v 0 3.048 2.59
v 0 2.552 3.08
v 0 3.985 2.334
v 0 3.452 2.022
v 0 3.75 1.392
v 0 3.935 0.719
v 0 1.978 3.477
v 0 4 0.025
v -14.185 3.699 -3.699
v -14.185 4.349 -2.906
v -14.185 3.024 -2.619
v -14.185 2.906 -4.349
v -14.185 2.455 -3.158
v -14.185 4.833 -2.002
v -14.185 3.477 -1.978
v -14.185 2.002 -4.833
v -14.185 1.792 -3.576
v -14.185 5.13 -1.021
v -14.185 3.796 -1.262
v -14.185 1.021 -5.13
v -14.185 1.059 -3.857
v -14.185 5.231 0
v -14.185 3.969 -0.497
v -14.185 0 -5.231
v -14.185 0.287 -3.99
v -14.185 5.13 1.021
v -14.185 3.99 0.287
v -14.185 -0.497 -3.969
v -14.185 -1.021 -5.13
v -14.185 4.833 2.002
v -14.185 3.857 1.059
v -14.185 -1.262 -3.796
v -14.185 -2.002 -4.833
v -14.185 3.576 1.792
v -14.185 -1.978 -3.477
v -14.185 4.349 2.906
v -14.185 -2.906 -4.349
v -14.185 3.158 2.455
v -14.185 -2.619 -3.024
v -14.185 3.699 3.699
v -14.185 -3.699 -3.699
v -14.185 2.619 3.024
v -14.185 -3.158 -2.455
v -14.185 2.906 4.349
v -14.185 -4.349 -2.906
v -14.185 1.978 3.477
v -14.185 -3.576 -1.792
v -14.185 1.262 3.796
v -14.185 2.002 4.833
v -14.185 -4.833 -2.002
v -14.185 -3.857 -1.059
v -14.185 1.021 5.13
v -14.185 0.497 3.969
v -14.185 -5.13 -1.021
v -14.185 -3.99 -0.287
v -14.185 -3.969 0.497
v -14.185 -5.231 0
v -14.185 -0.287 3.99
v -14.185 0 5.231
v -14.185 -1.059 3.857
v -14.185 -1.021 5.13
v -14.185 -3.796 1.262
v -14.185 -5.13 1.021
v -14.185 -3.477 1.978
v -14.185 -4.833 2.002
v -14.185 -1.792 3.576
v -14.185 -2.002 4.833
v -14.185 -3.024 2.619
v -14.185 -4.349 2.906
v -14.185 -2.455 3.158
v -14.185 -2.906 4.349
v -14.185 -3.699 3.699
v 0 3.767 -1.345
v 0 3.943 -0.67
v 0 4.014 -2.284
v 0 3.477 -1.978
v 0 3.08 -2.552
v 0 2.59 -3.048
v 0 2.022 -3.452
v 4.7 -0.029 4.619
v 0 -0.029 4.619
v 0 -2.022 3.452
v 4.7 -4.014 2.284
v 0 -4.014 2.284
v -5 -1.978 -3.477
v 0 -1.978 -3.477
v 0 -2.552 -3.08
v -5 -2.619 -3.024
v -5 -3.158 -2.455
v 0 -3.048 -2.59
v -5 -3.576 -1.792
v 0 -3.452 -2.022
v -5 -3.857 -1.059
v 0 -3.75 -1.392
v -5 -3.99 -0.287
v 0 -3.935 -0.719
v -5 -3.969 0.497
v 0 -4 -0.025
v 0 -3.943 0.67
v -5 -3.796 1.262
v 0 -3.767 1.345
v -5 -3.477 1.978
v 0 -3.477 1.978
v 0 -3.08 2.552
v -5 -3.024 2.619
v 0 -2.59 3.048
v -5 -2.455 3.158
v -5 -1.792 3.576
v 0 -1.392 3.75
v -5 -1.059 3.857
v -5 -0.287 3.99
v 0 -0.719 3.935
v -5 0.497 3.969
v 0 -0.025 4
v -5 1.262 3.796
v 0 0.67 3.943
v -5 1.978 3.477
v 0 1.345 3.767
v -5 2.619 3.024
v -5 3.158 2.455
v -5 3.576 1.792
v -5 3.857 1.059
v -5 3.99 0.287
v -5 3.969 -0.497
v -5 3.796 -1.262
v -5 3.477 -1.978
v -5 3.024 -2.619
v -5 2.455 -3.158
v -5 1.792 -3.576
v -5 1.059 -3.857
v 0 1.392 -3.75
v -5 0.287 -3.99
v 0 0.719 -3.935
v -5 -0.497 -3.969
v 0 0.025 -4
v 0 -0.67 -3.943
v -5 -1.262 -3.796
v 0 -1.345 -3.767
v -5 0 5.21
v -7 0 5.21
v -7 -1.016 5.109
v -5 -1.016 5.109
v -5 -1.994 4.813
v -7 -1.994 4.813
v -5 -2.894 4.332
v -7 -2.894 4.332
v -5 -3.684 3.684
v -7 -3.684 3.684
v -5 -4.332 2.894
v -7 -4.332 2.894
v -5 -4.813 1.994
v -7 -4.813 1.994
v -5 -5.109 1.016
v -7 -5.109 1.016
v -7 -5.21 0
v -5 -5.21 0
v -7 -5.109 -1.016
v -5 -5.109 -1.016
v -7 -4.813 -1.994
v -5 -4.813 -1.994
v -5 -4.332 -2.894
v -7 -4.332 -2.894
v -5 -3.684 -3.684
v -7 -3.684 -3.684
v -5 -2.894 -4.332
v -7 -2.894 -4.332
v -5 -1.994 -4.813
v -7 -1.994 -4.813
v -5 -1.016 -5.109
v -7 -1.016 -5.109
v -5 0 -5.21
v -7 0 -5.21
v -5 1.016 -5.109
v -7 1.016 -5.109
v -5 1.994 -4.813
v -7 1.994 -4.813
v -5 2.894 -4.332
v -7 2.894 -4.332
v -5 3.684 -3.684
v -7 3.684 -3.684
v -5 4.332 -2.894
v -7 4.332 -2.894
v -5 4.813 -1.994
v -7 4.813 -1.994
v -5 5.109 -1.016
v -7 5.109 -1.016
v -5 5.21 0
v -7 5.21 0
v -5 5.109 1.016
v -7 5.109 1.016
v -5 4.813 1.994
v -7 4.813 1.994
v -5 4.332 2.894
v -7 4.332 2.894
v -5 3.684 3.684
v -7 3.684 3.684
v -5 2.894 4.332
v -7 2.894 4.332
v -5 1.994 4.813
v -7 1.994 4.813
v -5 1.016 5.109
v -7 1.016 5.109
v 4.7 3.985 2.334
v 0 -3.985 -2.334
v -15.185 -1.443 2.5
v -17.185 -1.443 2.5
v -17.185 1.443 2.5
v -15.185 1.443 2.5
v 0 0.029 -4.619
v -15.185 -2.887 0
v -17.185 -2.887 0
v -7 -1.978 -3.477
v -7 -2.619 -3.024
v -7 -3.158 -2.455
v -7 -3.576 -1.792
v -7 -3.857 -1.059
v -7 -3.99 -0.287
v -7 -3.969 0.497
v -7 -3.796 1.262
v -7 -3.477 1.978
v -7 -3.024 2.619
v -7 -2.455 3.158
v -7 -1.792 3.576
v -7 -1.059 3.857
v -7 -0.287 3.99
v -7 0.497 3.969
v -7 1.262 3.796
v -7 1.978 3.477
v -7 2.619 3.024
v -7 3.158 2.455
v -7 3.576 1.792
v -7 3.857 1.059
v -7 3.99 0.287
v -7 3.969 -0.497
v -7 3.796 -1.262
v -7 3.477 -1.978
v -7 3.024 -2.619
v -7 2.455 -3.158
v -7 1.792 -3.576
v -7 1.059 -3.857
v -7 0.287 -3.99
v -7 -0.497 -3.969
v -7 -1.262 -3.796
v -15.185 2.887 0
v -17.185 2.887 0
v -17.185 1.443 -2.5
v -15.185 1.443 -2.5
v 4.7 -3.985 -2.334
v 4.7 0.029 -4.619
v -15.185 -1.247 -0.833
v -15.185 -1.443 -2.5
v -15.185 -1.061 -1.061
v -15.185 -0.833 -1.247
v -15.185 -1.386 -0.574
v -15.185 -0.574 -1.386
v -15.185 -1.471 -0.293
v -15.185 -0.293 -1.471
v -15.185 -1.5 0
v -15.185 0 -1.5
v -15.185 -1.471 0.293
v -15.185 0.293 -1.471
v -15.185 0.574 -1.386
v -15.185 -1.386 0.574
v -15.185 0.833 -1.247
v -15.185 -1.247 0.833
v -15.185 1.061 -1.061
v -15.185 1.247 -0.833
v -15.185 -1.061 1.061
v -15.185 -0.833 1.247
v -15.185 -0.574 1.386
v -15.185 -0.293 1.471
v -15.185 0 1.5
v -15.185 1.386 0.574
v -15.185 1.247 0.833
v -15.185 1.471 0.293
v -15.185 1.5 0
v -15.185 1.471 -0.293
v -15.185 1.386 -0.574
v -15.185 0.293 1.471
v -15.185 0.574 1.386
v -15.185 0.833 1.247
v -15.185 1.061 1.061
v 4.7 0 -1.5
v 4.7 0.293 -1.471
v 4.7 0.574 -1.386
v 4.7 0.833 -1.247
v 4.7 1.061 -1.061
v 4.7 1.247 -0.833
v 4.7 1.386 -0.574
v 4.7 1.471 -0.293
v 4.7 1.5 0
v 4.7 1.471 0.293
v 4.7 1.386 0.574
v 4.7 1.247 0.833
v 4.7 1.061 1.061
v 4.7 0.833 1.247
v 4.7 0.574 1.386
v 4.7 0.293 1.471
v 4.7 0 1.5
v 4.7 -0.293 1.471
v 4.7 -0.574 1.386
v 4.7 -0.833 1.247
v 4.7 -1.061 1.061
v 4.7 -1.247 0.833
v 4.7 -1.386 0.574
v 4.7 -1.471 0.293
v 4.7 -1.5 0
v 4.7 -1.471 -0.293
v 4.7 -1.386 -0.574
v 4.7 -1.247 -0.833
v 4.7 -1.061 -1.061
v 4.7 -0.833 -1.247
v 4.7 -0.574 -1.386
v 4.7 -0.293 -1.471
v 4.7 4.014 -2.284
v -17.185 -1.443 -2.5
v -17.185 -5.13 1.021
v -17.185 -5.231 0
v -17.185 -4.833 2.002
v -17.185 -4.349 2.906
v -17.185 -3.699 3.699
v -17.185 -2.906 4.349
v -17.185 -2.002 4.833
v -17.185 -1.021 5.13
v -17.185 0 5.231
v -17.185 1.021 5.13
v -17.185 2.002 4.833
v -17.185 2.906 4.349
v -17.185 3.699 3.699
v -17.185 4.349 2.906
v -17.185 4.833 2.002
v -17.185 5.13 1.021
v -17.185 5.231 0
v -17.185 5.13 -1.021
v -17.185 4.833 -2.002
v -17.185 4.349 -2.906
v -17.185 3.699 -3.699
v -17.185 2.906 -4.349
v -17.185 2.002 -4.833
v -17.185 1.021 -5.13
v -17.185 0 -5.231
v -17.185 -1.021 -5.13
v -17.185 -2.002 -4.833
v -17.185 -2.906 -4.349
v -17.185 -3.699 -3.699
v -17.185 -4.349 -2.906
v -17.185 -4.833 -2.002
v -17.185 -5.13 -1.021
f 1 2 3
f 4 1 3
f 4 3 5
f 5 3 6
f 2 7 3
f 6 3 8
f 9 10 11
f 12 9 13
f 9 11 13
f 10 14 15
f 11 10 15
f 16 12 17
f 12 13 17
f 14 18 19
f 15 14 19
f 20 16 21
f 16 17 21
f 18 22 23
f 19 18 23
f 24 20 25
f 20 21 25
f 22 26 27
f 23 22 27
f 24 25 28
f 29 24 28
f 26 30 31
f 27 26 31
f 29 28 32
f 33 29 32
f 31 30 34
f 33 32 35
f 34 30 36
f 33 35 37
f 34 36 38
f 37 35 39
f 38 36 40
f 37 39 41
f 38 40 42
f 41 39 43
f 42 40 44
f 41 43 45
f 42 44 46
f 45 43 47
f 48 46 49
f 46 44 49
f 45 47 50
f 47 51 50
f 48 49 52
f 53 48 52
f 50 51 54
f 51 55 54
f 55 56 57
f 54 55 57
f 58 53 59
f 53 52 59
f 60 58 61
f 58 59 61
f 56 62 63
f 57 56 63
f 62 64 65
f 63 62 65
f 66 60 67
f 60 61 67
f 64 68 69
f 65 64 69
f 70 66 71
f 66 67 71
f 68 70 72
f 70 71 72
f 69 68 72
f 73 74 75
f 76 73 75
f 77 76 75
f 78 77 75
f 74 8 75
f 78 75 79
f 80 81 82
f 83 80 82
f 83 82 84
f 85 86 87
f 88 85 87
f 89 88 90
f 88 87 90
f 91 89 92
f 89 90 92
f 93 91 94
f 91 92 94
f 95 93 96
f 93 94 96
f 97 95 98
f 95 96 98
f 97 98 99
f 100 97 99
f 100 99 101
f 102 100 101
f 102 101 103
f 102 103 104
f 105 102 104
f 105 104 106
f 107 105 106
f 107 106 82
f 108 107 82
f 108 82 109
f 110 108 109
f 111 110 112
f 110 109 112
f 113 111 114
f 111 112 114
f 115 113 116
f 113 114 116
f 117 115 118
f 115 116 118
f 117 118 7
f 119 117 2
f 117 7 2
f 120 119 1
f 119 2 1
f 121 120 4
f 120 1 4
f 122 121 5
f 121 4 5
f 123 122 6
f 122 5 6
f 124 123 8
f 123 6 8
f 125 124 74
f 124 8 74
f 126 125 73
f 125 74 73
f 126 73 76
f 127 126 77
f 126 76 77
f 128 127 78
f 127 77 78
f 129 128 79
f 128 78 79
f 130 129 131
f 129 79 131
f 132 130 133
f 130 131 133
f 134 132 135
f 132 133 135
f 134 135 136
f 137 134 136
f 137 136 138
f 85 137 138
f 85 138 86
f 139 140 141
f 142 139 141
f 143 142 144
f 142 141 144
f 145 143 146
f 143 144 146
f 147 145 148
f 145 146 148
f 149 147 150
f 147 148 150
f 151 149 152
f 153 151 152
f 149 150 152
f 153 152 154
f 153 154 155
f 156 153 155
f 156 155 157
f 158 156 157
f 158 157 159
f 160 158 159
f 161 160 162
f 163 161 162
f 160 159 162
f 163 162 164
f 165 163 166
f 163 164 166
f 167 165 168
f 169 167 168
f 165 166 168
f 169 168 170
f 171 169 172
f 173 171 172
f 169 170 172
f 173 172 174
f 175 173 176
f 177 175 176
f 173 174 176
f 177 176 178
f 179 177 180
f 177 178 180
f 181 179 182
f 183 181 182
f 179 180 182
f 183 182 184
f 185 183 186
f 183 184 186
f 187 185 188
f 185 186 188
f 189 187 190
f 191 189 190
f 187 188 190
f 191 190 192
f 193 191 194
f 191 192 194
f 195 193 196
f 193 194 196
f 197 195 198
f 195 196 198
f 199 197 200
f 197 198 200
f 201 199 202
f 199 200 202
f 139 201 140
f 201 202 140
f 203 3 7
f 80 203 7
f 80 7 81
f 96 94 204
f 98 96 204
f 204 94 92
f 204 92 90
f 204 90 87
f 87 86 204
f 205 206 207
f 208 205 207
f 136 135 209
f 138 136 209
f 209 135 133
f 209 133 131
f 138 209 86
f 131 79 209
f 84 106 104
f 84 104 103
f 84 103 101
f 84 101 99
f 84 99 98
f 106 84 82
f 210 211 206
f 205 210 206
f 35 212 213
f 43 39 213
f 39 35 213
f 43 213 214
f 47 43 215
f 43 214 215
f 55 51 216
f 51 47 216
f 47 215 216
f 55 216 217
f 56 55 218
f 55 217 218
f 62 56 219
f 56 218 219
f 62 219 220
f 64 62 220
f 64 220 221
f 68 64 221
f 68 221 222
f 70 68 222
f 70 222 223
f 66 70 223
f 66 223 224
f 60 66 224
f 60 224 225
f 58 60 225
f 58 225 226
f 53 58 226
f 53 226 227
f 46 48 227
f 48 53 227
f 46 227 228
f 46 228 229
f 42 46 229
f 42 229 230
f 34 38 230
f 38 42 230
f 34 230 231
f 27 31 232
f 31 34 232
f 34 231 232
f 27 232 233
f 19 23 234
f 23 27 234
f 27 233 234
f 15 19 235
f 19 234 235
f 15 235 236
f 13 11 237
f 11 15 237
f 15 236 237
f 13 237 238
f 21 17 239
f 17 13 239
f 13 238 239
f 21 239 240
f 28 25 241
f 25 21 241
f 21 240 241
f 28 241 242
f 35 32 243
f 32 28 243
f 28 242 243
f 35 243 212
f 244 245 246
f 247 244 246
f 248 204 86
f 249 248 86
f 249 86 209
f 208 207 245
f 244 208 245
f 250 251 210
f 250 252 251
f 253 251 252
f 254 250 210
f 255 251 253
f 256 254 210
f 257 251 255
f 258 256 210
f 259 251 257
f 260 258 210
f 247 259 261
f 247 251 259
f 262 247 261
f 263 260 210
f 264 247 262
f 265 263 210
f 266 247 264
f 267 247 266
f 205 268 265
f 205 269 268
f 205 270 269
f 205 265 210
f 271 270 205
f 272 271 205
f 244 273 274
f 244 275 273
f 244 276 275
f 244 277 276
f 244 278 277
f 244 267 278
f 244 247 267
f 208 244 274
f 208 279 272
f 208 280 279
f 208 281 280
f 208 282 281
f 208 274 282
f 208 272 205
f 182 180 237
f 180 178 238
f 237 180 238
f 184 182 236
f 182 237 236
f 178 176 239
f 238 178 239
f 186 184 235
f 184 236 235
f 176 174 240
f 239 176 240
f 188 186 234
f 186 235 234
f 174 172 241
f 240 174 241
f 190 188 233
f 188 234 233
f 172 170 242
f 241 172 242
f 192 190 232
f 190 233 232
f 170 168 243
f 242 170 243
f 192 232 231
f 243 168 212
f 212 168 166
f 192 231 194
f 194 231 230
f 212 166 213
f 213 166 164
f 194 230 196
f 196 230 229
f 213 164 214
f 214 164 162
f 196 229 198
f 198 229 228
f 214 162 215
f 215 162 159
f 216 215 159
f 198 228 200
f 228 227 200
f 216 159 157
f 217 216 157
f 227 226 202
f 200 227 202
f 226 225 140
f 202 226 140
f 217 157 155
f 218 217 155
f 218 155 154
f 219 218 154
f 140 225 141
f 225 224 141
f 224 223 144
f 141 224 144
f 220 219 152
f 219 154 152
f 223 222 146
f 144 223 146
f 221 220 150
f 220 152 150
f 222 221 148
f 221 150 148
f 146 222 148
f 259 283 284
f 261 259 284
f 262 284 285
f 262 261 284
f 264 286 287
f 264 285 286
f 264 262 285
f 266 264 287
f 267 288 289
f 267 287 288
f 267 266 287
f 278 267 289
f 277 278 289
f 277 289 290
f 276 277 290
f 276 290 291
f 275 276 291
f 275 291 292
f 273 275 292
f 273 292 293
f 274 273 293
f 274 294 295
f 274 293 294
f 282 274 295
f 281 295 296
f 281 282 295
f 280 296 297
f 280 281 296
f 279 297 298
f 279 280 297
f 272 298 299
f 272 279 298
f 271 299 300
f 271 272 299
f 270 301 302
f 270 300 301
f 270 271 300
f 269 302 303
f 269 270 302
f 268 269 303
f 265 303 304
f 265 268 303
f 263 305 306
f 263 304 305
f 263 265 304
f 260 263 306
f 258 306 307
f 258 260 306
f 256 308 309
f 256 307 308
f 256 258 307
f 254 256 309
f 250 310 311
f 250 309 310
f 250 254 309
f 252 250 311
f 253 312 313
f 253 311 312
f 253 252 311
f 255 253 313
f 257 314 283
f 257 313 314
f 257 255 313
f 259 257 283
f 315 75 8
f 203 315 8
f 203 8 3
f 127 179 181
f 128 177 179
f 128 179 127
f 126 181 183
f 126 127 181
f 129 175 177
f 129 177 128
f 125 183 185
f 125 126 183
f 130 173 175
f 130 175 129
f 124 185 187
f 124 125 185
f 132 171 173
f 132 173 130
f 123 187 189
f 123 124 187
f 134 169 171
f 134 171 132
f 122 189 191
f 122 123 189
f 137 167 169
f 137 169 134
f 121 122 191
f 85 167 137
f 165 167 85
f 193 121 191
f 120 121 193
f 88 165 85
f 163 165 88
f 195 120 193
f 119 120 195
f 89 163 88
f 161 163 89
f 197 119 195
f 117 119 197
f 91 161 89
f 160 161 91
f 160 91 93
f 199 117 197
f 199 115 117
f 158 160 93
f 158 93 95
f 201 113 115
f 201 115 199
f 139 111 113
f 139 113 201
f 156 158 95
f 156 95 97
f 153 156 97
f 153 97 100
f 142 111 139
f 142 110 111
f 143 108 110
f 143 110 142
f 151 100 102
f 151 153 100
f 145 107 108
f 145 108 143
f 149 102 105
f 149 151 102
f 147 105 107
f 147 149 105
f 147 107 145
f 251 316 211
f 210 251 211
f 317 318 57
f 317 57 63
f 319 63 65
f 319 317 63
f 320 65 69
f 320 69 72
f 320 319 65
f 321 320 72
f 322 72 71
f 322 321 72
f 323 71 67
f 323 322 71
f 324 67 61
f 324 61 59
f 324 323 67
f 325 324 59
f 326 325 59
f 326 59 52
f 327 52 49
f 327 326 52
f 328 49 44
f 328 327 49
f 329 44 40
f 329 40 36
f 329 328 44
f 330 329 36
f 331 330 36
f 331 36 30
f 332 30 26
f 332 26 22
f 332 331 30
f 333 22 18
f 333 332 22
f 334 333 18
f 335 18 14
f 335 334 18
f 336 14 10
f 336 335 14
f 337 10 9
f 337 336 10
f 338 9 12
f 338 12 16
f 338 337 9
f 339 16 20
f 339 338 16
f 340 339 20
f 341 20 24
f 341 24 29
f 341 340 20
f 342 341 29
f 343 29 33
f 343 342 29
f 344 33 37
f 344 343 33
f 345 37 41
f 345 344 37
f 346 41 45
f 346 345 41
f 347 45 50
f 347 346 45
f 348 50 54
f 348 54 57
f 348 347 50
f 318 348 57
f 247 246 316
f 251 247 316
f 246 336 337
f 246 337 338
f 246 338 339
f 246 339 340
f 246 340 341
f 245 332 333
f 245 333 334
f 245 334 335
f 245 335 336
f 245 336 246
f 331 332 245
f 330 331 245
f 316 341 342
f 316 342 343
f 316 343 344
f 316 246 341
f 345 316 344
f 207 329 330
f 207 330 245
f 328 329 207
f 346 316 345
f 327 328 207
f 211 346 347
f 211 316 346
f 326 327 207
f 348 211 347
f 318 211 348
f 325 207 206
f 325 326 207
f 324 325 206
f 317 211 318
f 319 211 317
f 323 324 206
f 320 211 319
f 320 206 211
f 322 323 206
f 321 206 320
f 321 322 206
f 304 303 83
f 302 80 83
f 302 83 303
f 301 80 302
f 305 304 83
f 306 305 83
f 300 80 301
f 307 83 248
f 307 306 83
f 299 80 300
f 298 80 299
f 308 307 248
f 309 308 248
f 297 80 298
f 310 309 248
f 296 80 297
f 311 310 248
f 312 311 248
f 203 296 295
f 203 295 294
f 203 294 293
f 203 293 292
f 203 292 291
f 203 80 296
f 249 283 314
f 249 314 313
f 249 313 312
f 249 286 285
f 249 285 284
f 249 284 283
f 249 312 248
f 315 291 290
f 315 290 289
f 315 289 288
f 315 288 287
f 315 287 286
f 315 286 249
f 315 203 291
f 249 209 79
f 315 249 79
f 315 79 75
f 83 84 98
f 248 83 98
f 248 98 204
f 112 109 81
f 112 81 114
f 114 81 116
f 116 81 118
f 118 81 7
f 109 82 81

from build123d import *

# Parameters (mm, degrees)
BOSS_EXTRUDE1_DEPTH     = 4.7
SKETCH3_R               = 4
SKETCH3_R_2             = 1.5
BOSS_EXTRUDE2_DEPTH     = 17.185
SKETCH4_R               = 5.231012233
BOSS_EXTRUDE3_DEPTH     = 3
CUT_EXTRUDE1_DEPTH      = 24.101519495
CUT_EXTRUDE1_DEPTH_BACK = 24.101519495
SKETCH2_R               = 1.5
CUT_EXTRUDE4_DEPTH      = 2
BOSS_EXTRUDE5_START     = -7
SKETCH7_R               = 5.209530261
SKETCH7_R_2             = 1.5
BOSS_EXTRUDE5_DEPTH     = 2


with BuildPart() as part:
    # Sketch1 → Boss-Extrude1 (new body)
    with BuildSketch(Plane(origin=(0, 0, 0), x_dir=(0, 0, -1), z_dir=(1, 0, 0))):
        Polygon((-4.618711934, -0.028868683), (-2.284354955, -4.014356209), (2.33435698, -3.985487527), (4.618711934, 0.028868683), (2.284354955, 4.014356209), (-2.33435698, 3.985487527), align=None)
    extrude(amount=BOSS_EXTRUDE1_DEPTH)

    # Sketch3 → Boss-Extrude2 (add)
    with BuildSketch(Plane.ZY):
        with Locations(Location((0, 0, 0), (0, 0, 209.641884541))):
            Circle(SKETCH3_R)
        with Locations(Location((0, 0, 0), (0, 0, 180))):
            Circle(SKETCH3_R_2, mode=Mode.SUBTRACT)
    extrude(amount=BOSS_EXTRUDE2_DEPTH)

    # Sketch4 → Boss-Extrude3 (add)
    with BuildSketch(Plane.ZY.offset(17.185)):
        with Locations(Location((0, 0, 0), (0, 0, 270))):
            Circle(SKETCH4_R)
    extrude(amount=-BOSS_EXTRUDE3_DEPTH)

    # Sketch2 → Cut-Extrude1 (cut, two sides: drawn at the far end of the back side and taken through both)
    with BuildSketch(Plane(origin=(4.7, 0, 0), x_dir=(0, 0, -1), z_dir=(1, 0, 0)).offset(-CUT_EXTRUDE1_DEPTH_BACK)):
        Circle(SKETCH2_R)
    extrude(amount=CUT_EXTRUDE1_DEPTH + CUT_EXTRUDE1_DEPTH_BACK, mode=Mode.SUBTRACT)

    # Sketch6 → Cut-Extrude4 (cut)
    with BuildSketch(Plane.ZY.offset(17.185)):
        Polygon((0, -2.886751346), (2.5, -1.443375673), (2.5, 1.443375673), (0, 2.886751346), (-2.5, 1.443375673), (-2.5, -1.443375673), align=None)
    extrude(amount=-CUT_EXTRUDE4_DEPTH, mode=Mode.SUBTRACT)

    # Sketch7 → Boss-Extrude5 (add)
    with BuildSketch(Plane(origin=(0, 0, 0), x_dir=(0, 0, -1), z_dir=(1, 0, 0)).offset(BOSS_EXTRUDE5_START)):
        with Locations(Location((0, 0, 0), (0, 0, 180))):
            Circle(SKETCH7_R)
        Circle(SKETCH7_R_2, mode=Mode.SUBTRACT)
    extrude(amount=BOSS_EXTRUDE5_DEPTH)


solid = part.part
